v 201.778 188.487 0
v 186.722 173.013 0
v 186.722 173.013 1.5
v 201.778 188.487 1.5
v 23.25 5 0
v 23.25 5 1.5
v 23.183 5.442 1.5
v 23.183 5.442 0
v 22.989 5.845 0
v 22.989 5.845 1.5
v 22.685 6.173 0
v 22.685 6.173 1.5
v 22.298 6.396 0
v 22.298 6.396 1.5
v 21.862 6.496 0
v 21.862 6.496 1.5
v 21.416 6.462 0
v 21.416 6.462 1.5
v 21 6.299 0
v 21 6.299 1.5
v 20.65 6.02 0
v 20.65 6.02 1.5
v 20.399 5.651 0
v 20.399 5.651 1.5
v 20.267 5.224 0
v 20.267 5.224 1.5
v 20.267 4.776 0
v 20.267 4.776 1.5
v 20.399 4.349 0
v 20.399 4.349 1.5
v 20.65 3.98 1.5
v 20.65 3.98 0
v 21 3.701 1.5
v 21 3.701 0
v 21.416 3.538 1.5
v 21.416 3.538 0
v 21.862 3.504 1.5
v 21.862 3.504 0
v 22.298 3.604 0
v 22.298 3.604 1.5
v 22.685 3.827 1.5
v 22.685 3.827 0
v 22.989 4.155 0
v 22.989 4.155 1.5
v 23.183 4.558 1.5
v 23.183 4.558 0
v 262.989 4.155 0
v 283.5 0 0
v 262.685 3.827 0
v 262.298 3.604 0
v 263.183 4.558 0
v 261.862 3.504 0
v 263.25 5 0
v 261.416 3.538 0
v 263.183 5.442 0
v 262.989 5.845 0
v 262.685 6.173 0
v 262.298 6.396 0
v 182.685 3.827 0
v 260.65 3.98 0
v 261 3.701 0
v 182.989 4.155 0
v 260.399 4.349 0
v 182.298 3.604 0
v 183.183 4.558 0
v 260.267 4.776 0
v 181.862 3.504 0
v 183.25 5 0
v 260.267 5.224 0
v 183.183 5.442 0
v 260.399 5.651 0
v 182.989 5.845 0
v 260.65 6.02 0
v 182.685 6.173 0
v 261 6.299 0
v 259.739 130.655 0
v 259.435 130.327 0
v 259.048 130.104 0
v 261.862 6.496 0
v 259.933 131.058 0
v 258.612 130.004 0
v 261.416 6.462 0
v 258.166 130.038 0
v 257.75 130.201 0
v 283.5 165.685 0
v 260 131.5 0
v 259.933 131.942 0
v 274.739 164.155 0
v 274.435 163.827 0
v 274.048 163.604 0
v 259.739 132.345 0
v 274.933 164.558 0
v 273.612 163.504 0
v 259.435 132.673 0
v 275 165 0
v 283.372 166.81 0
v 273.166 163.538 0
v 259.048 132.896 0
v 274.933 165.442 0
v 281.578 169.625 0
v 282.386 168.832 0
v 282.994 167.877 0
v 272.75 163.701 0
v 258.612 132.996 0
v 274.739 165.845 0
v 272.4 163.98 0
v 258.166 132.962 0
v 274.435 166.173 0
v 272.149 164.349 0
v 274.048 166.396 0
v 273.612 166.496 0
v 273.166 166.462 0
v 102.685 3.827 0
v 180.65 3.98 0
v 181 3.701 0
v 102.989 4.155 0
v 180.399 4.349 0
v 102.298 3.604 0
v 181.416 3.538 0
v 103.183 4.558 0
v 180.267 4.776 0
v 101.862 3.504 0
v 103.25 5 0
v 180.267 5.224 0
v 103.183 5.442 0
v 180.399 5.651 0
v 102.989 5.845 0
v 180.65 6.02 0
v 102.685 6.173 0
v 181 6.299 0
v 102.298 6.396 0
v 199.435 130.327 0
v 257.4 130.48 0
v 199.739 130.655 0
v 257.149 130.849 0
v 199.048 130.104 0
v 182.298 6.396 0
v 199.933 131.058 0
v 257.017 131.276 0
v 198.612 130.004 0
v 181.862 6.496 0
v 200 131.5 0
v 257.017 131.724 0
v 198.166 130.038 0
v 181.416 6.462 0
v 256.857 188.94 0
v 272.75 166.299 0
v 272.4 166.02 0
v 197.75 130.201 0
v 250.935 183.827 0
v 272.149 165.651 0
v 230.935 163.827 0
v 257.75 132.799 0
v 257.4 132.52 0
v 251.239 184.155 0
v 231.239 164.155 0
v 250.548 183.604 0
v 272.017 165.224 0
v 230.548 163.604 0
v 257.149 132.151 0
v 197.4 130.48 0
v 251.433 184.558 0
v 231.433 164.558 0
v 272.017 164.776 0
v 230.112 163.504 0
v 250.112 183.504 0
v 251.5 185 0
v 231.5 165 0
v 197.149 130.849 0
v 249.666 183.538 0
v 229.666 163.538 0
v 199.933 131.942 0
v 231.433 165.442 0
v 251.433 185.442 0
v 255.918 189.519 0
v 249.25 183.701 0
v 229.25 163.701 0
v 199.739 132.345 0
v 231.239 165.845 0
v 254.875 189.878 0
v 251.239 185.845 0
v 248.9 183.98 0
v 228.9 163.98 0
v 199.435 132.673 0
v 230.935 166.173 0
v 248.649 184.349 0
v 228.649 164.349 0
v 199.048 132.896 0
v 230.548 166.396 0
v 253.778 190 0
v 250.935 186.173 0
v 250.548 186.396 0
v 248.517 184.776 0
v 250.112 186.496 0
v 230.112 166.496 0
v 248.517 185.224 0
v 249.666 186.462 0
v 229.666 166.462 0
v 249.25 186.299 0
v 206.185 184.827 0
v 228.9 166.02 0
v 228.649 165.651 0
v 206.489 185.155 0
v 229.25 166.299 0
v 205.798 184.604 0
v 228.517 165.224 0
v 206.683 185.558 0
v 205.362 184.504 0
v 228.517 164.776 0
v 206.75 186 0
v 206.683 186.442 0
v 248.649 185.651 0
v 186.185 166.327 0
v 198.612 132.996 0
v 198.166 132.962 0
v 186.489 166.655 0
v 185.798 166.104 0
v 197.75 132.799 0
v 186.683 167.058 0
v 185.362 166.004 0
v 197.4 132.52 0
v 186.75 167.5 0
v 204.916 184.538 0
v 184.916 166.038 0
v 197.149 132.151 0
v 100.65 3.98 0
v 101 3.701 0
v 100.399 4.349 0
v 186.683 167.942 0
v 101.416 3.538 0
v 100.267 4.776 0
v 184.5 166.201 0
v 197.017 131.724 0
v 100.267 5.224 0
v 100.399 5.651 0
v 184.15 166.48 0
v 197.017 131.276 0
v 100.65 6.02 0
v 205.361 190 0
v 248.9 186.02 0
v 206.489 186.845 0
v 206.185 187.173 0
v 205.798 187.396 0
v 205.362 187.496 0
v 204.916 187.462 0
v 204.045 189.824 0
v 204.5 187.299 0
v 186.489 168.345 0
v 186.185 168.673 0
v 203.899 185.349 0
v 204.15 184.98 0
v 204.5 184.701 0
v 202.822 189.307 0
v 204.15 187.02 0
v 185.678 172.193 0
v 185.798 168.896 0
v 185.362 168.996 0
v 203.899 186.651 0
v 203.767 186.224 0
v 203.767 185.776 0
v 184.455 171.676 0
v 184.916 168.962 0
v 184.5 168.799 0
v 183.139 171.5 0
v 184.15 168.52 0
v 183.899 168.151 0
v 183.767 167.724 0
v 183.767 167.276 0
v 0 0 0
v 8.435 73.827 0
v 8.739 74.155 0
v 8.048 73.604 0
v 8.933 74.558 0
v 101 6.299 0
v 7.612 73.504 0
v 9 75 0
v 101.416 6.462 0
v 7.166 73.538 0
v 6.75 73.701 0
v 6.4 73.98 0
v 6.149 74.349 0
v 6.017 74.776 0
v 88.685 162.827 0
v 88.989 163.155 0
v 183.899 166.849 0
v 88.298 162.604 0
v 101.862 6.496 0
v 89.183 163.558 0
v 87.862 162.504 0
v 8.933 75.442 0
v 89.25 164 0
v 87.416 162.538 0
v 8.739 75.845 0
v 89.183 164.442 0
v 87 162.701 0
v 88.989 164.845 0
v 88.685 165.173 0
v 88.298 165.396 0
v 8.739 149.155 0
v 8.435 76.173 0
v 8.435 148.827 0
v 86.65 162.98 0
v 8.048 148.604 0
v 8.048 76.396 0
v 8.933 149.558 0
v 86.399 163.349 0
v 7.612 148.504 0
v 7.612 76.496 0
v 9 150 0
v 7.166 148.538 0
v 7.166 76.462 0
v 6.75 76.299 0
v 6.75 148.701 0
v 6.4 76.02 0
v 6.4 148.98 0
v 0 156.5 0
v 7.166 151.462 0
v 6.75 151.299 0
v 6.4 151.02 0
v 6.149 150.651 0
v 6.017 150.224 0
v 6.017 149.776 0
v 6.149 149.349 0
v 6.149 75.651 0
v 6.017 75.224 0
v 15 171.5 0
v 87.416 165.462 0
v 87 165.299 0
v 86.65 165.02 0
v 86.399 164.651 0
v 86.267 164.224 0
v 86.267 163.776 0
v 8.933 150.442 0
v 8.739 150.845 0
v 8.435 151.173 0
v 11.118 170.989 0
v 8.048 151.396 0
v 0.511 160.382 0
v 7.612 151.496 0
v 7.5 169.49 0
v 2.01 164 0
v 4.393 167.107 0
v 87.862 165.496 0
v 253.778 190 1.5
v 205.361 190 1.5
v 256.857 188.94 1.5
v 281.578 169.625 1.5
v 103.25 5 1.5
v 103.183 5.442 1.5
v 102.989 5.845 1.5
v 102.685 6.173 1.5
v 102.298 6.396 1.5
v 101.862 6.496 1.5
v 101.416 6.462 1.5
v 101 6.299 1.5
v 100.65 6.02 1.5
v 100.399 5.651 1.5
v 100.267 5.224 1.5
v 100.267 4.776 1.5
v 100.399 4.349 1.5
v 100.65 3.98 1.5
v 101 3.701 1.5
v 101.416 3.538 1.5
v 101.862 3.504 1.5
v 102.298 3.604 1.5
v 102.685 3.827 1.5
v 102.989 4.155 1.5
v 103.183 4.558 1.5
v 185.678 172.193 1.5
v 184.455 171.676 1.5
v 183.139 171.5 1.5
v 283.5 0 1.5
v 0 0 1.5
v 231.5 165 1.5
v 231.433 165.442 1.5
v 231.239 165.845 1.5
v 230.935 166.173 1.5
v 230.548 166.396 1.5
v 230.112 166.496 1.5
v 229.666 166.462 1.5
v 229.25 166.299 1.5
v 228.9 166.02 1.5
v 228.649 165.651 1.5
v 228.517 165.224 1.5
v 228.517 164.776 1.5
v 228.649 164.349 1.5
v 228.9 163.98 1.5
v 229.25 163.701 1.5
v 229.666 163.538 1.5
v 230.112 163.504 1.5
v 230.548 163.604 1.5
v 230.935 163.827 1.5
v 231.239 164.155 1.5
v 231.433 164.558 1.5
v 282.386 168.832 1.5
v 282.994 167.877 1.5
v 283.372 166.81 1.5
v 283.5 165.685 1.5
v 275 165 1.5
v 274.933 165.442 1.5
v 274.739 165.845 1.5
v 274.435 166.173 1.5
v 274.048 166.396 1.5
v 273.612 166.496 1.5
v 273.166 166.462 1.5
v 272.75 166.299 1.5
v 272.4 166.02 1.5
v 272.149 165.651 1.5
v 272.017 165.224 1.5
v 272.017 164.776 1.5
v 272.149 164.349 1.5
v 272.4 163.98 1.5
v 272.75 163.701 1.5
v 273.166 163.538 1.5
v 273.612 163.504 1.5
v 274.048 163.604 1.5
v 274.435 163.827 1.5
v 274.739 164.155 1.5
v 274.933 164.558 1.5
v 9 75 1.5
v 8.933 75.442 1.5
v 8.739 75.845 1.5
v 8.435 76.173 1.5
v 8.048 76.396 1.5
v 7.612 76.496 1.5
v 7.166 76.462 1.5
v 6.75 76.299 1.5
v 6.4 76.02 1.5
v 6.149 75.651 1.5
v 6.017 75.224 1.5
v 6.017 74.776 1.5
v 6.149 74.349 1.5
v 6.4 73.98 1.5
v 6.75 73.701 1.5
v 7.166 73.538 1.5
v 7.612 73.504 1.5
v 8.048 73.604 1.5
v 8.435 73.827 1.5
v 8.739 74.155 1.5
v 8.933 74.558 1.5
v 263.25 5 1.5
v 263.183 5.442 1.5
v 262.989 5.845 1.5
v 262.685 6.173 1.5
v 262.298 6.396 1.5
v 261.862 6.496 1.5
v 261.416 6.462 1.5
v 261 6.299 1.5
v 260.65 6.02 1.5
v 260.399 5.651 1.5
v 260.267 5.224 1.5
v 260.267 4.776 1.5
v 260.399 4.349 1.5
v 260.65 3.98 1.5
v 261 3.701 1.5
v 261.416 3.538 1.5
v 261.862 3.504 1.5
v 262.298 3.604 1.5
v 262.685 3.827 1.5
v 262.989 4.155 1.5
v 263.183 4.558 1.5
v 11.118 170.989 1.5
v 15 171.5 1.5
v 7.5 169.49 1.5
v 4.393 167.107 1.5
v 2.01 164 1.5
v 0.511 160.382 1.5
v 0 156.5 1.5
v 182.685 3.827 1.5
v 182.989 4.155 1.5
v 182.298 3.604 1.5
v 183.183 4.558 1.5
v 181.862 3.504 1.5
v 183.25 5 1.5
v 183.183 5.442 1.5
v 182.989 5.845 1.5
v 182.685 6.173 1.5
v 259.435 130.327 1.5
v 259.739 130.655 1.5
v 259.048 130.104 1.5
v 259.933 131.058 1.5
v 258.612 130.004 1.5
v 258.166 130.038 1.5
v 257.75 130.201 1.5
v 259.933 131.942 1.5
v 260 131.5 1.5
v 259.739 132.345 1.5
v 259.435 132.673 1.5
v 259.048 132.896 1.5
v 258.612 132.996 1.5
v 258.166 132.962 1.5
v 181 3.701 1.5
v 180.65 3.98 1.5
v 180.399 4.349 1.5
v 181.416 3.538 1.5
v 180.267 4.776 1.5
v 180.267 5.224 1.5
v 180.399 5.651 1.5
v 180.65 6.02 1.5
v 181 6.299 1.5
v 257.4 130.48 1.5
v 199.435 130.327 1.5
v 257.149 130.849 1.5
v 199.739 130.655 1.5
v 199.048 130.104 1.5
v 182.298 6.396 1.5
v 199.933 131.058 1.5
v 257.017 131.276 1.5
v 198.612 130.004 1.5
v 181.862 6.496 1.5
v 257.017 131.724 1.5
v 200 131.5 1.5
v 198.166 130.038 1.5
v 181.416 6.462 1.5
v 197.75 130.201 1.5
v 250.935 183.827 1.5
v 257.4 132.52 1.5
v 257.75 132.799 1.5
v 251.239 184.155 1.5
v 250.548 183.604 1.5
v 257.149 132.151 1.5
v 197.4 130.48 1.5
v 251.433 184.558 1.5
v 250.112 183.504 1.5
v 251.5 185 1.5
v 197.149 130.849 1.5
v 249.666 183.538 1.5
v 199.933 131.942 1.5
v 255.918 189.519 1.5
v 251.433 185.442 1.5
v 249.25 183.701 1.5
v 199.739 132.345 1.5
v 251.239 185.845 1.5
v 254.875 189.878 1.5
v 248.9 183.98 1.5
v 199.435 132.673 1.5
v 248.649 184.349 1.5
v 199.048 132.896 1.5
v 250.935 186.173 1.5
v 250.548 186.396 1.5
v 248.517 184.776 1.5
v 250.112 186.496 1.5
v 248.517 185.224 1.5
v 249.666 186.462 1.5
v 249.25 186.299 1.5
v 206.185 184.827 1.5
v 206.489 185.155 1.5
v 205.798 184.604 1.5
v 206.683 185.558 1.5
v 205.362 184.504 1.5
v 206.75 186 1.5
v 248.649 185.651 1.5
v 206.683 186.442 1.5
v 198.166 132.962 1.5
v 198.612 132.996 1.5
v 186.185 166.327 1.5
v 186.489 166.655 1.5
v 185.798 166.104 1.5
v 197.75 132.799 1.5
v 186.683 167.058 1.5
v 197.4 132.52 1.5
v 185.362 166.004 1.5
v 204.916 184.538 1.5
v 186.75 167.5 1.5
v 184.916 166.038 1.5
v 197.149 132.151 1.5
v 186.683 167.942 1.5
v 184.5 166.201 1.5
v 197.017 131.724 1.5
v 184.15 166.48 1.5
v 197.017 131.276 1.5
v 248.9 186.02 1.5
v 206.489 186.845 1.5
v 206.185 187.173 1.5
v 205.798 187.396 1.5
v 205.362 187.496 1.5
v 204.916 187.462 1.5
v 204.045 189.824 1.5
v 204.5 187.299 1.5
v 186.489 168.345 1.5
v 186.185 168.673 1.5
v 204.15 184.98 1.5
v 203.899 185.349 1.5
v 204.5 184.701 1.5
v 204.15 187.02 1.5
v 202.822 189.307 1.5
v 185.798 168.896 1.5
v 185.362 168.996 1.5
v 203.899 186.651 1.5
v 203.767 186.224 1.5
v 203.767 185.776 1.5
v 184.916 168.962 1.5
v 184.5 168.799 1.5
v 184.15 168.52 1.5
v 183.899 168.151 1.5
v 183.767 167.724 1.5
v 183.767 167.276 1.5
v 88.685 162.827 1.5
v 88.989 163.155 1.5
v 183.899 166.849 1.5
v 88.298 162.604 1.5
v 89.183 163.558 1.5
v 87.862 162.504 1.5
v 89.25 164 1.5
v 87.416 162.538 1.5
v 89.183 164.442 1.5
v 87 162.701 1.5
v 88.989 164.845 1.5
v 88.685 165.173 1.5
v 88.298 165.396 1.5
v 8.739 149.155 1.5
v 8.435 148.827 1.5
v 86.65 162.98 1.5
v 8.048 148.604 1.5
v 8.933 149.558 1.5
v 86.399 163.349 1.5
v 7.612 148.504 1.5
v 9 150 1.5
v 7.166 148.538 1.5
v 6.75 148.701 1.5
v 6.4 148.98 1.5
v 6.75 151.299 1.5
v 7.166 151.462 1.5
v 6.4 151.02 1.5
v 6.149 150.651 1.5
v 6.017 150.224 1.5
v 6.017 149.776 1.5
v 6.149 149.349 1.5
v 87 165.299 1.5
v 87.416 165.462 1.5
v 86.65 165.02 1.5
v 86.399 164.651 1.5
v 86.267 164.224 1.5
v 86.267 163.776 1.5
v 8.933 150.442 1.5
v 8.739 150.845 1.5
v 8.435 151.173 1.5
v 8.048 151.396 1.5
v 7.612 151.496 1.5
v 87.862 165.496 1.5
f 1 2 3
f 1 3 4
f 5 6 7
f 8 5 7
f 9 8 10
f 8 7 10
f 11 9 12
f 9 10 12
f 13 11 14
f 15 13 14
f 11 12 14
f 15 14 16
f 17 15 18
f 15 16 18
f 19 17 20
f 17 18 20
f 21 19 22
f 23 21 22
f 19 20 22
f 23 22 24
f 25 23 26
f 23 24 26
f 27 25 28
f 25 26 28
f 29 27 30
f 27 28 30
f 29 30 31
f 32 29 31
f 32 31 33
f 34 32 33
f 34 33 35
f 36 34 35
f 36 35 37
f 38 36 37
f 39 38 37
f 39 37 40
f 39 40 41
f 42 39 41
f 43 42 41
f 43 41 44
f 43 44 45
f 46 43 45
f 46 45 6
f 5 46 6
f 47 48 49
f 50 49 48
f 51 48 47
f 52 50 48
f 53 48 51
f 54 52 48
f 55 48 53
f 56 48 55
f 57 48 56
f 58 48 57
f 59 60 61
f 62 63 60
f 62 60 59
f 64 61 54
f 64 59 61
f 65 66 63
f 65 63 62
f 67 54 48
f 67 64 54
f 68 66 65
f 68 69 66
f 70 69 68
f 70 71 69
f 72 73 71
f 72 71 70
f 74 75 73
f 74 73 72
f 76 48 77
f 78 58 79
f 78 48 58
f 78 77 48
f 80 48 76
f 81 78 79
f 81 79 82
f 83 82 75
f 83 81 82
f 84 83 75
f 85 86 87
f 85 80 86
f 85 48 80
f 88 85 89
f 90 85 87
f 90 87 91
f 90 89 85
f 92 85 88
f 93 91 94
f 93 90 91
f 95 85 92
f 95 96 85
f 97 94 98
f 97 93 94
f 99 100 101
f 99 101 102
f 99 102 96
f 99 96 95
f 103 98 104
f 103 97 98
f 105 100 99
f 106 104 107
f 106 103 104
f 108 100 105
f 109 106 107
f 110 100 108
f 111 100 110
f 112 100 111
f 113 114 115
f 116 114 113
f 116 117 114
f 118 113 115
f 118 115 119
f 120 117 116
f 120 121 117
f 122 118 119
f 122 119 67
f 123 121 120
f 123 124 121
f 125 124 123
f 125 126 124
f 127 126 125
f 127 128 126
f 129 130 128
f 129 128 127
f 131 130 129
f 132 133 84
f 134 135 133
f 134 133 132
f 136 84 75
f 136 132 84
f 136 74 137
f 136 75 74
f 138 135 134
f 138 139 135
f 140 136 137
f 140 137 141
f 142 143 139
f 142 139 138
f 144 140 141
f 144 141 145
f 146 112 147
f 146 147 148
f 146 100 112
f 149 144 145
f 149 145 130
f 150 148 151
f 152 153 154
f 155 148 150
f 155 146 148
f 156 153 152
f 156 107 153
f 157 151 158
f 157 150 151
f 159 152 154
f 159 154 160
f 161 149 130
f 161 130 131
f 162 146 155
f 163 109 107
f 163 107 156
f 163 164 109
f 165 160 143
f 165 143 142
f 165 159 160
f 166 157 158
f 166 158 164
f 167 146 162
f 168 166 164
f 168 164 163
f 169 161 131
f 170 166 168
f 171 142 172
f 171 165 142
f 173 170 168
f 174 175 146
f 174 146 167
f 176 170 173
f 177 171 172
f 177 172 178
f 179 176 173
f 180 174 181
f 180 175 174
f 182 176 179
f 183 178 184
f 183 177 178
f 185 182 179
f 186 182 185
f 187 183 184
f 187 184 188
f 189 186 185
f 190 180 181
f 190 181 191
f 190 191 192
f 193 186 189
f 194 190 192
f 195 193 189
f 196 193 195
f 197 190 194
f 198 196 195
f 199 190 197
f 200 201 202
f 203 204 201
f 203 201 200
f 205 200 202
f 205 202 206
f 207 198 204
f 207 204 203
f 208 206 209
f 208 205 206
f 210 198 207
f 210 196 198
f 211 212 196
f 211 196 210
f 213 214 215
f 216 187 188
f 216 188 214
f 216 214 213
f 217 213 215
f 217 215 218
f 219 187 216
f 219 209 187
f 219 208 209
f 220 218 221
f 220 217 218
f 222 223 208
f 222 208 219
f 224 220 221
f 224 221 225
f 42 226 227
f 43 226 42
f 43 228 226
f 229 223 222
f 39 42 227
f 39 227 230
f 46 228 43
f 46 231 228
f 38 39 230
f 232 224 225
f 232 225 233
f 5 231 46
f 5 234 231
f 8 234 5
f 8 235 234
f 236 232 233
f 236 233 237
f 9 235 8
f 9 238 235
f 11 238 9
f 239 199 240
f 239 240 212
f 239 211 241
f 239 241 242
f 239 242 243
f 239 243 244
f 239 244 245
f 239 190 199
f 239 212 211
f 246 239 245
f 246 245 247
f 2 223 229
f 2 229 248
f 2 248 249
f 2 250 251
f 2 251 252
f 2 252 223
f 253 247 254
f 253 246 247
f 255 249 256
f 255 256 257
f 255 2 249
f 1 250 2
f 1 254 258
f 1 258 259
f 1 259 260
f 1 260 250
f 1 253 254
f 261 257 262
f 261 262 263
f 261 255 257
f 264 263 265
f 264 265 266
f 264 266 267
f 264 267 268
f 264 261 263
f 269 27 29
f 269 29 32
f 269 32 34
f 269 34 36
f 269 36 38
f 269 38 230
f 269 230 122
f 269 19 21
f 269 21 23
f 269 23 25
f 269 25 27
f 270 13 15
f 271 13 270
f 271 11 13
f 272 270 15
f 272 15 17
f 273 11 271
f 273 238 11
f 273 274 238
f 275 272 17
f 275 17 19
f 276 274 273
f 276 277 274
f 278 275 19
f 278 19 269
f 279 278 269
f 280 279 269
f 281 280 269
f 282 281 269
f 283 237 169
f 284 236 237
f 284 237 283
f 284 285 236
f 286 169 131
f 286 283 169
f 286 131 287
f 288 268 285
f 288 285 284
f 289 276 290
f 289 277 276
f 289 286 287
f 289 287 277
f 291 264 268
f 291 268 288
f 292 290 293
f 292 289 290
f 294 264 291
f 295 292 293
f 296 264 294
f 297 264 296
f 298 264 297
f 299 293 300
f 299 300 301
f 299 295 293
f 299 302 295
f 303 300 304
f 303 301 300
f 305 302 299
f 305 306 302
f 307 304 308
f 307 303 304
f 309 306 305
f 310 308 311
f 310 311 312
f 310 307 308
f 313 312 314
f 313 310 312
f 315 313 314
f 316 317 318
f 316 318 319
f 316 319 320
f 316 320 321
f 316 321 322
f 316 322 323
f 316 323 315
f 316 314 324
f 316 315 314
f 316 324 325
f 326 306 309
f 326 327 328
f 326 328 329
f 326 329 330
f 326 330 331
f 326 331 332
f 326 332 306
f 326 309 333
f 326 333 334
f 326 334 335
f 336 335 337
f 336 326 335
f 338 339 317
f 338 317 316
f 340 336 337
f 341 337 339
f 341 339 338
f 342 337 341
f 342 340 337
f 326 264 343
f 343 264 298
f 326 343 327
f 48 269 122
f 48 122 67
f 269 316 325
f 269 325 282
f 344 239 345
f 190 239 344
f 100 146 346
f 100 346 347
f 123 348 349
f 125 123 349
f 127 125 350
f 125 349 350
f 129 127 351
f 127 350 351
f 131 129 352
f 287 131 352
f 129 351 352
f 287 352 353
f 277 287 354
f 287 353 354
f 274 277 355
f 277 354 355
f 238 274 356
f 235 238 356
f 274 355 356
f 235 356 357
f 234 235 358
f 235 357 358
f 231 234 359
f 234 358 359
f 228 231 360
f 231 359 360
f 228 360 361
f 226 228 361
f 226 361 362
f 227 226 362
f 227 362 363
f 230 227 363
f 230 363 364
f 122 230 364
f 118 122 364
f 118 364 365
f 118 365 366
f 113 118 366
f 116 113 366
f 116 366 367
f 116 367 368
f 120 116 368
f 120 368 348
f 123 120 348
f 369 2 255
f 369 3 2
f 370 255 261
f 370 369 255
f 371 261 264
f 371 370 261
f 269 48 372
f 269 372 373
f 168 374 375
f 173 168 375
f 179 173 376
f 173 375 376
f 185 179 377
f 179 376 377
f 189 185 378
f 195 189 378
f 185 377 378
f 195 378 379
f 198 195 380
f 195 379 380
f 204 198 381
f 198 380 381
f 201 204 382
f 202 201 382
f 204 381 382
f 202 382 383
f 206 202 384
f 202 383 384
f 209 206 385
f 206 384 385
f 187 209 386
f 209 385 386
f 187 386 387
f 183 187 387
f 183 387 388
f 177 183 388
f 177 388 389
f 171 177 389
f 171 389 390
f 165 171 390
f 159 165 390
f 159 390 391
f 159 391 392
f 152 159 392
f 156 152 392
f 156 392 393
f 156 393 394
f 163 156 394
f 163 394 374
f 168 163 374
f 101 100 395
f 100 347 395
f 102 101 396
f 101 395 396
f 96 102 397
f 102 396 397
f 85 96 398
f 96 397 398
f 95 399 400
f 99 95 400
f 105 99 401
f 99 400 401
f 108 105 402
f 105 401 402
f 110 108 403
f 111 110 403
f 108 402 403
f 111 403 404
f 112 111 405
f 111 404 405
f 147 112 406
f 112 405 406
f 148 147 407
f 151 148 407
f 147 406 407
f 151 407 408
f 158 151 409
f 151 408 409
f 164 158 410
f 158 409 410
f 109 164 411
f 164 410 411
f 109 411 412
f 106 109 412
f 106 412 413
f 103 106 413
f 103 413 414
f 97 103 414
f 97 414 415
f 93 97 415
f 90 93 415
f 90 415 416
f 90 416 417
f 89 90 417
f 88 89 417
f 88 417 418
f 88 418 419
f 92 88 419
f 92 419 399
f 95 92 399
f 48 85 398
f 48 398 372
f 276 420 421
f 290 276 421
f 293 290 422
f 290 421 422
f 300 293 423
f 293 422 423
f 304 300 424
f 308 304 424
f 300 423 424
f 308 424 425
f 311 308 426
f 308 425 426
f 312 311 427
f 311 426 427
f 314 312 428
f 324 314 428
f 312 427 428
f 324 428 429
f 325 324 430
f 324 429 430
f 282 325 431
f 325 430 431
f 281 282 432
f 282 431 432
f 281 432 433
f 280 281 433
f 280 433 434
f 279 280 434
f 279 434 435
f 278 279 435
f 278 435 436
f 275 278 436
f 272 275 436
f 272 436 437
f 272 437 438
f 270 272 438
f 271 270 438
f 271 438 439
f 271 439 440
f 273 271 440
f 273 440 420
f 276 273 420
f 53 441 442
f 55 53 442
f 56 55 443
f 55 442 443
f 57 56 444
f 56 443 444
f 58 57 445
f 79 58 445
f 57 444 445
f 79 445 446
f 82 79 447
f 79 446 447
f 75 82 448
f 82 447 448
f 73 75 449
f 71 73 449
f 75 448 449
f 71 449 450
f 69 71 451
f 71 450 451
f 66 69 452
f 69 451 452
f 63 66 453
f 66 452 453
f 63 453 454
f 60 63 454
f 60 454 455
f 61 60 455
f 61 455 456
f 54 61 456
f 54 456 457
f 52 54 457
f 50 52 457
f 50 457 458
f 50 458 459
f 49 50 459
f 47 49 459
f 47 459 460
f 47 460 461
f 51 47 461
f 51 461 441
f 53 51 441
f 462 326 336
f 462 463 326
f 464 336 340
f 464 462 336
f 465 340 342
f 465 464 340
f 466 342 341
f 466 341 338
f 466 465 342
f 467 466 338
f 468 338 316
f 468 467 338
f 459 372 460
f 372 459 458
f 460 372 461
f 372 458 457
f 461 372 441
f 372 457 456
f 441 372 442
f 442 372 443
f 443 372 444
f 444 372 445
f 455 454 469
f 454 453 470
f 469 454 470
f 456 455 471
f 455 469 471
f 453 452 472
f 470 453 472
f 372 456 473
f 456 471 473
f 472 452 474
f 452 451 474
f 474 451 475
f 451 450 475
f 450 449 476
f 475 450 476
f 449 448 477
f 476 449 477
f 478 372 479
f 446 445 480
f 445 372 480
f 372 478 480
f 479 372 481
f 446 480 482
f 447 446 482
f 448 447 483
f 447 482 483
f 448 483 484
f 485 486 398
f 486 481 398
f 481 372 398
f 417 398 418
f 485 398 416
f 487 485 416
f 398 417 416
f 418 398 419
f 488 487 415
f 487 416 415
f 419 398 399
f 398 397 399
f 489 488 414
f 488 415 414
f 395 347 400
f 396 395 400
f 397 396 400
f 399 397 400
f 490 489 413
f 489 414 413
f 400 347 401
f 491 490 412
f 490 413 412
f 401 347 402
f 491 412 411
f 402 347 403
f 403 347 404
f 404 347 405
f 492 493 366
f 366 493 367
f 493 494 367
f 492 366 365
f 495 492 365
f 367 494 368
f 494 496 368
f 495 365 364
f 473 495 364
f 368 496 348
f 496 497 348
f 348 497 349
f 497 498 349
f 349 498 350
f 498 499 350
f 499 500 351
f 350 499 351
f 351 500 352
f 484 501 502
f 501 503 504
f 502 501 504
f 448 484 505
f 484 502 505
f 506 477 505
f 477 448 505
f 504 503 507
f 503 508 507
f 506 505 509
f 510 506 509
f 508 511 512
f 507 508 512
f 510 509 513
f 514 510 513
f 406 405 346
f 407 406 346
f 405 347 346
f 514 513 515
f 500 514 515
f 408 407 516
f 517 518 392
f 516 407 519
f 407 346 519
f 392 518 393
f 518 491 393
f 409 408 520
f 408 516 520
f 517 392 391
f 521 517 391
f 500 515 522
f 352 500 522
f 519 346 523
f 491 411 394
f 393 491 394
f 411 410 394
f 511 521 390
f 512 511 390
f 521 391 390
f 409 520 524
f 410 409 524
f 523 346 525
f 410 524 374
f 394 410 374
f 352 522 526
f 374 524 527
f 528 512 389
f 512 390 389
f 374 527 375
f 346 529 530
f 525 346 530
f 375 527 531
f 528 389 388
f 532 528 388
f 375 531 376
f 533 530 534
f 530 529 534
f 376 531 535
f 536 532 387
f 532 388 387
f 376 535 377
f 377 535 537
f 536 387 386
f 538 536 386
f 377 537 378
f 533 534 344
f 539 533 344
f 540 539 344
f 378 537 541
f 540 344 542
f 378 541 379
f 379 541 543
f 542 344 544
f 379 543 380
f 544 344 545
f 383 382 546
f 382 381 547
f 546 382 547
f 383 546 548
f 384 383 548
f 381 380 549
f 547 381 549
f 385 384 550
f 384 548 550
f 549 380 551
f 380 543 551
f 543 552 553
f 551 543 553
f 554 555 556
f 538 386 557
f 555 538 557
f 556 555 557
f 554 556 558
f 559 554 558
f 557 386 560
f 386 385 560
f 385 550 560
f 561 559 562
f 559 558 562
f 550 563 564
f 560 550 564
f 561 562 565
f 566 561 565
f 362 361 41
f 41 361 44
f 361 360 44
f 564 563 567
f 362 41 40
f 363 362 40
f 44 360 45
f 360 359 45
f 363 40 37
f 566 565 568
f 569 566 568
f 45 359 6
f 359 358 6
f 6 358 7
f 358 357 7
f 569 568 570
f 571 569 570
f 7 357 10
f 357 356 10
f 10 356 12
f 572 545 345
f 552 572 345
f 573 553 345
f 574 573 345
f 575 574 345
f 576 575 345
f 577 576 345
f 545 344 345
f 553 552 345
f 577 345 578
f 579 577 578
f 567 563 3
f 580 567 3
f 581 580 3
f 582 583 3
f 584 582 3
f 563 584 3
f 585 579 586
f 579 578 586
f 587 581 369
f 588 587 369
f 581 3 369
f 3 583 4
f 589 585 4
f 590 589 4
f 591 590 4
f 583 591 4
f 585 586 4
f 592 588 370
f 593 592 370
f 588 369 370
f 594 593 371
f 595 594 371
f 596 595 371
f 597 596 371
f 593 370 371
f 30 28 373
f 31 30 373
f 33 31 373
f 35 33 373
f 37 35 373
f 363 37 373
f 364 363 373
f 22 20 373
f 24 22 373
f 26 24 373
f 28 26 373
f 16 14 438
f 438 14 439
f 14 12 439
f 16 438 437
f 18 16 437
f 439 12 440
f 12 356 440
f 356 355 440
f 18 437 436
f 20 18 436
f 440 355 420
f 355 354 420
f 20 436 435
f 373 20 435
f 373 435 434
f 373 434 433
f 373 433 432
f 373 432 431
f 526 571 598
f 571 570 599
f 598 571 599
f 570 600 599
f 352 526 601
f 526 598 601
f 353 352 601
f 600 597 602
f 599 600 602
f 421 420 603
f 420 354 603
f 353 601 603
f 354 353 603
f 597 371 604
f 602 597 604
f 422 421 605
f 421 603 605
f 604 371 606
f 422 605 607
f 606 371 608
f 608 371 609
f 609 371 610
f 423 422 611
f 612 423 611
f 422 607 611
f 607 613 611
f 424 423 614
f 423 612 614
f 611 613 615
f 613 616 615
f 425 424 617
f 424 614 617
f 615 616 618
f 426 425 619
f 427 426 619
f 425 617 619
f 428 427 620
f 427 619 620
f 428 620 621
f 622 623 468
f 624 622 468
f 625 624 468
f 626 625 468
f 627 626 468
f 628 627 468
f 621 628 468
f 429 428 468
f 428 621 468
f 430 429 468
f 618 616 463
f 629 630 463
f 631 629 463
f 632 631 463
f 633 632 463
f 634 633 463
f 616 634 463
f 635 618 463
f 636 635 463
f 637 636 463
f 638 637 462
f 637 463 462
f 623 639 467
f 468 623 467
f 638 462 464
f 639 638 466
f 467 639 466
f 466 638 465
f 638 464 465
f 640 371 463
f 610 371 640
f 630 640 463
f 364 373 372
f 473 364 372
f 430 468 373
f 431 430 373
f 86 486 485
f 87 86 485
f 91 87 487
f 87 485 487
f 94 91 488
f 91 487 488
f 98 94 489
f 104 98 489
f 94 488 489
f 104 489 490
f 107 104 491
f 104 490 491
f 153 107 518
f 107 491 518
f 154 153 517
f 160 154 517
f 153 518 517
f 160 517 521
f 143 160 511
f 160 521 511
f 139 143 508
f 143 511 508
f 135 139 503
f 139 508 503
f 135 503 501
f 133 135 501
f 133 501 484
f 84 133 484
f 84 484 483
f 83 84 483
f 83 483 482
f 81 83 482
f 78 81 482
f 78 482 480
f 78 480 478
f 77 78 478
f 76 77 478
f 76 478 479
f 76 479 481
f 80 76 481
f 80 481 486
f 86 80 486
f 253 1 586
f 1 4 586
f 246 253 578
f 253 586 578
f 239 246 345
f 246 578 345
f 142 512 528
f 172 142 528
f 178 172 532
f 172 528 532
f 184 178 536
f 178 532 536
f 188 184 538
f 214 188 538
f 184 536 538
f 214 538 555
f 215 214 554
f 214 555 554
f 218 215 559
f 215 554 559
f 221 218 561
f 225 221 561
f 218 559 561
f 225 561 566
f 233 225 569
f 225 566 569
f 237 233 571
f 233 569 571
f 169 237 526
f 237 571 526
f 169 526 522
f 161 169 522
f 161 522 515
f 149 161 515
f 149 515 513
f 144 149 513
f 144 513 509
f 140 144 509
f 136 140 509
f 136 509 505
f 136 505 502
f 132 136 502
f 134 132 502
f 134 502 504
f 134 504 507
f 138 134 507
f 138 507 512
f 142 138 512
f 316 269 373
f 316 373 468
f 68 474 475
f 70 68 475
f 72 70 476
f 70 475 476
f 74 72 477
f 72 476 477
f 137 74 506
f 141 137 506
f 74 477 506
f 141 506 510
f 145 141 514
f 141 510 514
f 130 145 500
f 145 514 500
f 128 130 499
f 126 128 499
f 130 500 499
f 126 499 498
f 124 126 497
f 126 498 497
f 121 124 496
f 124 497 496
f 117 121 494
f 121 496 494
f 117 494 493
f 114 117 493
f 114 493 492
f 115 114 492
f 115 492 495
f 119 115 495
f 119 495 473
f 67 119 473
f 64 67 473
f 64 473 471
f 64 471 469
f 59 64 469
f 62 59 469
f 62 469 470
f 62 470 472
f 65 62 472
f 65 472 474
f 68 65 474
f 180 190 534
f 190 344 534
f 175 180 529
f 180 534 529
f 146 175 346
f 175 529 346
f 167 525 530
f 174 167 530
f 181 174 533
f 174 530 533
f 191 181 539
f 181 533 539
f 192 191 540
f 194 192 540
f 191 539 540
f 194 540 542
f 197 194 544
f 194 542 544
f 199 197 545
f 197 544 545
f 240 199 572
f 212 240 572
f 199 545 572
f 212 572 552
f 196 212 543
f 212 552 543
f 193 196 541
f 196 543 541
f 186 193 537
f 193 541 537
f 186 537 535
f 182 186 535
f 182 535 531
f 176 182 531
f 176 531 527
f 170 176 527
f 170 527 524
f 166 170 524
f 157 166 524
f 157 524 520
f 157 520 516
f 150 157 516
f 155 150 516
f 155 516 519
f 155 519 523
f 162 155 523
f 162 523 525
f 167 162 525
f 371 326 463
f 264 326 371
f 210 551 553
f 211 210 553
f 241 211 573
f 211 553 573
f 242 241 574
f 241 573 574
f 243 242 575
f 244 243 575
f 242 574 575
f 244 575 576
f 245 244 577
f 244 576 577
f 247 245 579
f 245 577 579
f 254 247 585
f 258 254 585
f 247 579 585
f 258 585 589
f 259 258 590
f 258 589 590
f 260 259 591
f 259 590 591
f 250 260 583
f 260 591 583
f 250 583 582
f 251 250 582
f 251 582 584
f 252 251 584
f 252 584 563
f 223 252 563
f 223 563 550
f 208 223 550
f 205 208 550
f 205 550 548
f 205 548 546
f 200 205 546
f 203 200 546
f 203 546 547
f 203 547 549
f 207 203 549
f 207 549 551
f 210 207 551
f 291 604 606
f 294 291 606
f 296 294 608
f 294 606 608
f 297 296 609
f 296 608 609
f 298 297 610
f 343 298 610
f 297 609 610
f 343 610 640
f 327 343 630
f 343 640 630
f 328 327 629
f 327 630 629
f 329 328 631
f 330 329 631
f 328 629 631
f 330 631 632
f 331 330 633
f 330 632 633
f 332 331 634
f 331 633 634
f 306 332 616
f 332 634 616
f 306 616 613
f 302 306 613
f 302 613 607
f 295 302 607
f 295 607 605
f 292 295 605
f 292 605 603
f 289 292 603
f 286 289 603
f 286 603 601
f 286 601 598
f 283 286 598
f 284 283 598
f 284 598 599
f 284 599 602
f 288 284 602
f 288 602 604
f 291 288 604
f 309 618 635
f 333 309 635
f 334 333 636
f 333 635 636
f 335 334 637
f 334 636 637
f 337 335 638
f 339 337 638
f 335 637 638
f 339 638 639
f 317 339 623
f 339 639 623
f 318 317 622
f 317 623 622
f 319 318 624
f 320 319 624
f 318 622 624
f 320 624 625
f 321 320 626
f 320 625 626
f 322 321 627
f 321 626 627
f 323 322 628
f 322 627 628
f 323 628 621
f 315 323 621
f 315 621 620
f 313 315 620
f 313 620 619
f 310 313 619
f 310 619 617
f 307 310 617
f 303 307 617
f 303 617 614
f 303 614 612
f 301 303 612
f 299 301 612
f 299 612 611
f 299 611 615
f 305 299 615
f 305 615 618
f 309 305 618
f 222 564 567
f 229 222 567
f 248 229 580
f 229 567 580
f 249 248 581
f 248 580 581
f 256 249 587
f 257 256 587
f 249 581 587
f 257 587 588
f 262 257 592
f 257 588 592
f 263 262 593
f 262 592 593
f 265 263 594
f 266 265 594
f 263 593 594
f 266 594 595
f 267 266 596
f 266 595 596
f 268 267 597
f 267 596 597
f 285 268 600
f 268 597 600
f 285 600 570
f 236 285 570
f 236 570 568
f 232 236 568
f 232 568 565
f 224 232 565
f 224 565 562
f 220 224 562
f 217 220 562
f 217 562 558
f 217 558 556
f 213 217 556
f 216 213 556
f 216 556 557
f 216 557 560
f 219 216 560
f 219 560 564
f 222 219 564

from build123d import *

# Parameters (mm, degrees)
BOSS_EXTRU_1_DEPTH      = 1.5
ESQUISSE2_R             = 1.5
ENL_V_MAT_EXTRU_1_DEPTH = 342.283606404
CONG_1_R                = 5
CONG_2_R                = 15
ESQUISSE3_R             = 1.5
ENL_V_MAT_EXTRU_2_DEPTH = 342.283606404


with BuildPart() as part:
    # Esquisse1 → Boss.-Extru.1 (new body)
    with BuildSketch(Plane.XY):
        Polygon((185.25, 171.5), (203.25, 190), (255.5, 190), (283.5, 168.124002458), (283.5, 0), (0, 0), (0, 171.5), align=None)
    extrude(amount=BOSS_EXTRU_1_DEPTH)

    # Esquisse2 → Enlèv. mat.-Extru.1 (cut, through all)
    with BuildSketch(Plane.XY.offset(1.5)):
        with Locations((261.75, 5)):
            Circle(ESQUISSE2_R)
        with Locations((181.75, 5)):
            Circle(ESQUISSE2_R)
        with Locations((101.75, 5)):
            Circle(ESQUISSE2_R)
        with Locations((21.75, 5)):
            Circle(ESQUISSE2_R)
        with Locations((7.5, 75)):
            Circle(ESQUISSE2_R)
        with Locations((7.5, 150)):
            Circle(ESQUISSE2_R)
        with Locations((87.75, 164)):
            Circle(ESQUISSE2_R)
        with Locations((185.25, 167.5)):
            Circle(ESQUISSE2_R)
        with Locations((205.25, 186)):
            Circle(ESQUISSE2_R)
        with Locations((230, 165)):
            Circle(ESQUISSE2_R)
        with Locations((250, 185)):
            Circle(ESQUISSE2_R)
        with Locations((273.5, 165)):
            Circle(ESQUISSE2_R)
    extrude(amount=-ENL_V_MAT_EXTRU_1_DEPTH, mode=Mode.SUBTRACT)

    # Congé1
    cong_1_edges = [part.edges().sort_by_distance(p)[0] for p in [
        (185.25, 171.5, 0.75),
        (203.25, 190, 0.75),
        (255.5, 190, 0.75),
        (283.5, 168.124002458, 0.75),
    ]]
    fillet(cong_1_edges, radius=CONG_1_R)

    # Congé2
    cong_2_edges = [part.edges().sort_by_distance(p)[0] for p in [
        (0, 171.5, 0.75),
    ]]
    fillet(cong_2_edges, radius=CONG_2_R)

    # Esquisse3 → Enlèv. mat.-Extru.2 (cut, through all)
    with BuildSketch(Plane.XY.offset(1.5)):
        with Locations((198.5, 131.5)):
            Circle(ESQUISSE3_R)
        with Locations((258.5, 131.5)):
            Circle(ESQUISSE3_R)
    extrude(amount=-ENL_V_MAT_EXTRU_2_DEPTH, mode=Mode.SUBTRACT)


solid = part.part
